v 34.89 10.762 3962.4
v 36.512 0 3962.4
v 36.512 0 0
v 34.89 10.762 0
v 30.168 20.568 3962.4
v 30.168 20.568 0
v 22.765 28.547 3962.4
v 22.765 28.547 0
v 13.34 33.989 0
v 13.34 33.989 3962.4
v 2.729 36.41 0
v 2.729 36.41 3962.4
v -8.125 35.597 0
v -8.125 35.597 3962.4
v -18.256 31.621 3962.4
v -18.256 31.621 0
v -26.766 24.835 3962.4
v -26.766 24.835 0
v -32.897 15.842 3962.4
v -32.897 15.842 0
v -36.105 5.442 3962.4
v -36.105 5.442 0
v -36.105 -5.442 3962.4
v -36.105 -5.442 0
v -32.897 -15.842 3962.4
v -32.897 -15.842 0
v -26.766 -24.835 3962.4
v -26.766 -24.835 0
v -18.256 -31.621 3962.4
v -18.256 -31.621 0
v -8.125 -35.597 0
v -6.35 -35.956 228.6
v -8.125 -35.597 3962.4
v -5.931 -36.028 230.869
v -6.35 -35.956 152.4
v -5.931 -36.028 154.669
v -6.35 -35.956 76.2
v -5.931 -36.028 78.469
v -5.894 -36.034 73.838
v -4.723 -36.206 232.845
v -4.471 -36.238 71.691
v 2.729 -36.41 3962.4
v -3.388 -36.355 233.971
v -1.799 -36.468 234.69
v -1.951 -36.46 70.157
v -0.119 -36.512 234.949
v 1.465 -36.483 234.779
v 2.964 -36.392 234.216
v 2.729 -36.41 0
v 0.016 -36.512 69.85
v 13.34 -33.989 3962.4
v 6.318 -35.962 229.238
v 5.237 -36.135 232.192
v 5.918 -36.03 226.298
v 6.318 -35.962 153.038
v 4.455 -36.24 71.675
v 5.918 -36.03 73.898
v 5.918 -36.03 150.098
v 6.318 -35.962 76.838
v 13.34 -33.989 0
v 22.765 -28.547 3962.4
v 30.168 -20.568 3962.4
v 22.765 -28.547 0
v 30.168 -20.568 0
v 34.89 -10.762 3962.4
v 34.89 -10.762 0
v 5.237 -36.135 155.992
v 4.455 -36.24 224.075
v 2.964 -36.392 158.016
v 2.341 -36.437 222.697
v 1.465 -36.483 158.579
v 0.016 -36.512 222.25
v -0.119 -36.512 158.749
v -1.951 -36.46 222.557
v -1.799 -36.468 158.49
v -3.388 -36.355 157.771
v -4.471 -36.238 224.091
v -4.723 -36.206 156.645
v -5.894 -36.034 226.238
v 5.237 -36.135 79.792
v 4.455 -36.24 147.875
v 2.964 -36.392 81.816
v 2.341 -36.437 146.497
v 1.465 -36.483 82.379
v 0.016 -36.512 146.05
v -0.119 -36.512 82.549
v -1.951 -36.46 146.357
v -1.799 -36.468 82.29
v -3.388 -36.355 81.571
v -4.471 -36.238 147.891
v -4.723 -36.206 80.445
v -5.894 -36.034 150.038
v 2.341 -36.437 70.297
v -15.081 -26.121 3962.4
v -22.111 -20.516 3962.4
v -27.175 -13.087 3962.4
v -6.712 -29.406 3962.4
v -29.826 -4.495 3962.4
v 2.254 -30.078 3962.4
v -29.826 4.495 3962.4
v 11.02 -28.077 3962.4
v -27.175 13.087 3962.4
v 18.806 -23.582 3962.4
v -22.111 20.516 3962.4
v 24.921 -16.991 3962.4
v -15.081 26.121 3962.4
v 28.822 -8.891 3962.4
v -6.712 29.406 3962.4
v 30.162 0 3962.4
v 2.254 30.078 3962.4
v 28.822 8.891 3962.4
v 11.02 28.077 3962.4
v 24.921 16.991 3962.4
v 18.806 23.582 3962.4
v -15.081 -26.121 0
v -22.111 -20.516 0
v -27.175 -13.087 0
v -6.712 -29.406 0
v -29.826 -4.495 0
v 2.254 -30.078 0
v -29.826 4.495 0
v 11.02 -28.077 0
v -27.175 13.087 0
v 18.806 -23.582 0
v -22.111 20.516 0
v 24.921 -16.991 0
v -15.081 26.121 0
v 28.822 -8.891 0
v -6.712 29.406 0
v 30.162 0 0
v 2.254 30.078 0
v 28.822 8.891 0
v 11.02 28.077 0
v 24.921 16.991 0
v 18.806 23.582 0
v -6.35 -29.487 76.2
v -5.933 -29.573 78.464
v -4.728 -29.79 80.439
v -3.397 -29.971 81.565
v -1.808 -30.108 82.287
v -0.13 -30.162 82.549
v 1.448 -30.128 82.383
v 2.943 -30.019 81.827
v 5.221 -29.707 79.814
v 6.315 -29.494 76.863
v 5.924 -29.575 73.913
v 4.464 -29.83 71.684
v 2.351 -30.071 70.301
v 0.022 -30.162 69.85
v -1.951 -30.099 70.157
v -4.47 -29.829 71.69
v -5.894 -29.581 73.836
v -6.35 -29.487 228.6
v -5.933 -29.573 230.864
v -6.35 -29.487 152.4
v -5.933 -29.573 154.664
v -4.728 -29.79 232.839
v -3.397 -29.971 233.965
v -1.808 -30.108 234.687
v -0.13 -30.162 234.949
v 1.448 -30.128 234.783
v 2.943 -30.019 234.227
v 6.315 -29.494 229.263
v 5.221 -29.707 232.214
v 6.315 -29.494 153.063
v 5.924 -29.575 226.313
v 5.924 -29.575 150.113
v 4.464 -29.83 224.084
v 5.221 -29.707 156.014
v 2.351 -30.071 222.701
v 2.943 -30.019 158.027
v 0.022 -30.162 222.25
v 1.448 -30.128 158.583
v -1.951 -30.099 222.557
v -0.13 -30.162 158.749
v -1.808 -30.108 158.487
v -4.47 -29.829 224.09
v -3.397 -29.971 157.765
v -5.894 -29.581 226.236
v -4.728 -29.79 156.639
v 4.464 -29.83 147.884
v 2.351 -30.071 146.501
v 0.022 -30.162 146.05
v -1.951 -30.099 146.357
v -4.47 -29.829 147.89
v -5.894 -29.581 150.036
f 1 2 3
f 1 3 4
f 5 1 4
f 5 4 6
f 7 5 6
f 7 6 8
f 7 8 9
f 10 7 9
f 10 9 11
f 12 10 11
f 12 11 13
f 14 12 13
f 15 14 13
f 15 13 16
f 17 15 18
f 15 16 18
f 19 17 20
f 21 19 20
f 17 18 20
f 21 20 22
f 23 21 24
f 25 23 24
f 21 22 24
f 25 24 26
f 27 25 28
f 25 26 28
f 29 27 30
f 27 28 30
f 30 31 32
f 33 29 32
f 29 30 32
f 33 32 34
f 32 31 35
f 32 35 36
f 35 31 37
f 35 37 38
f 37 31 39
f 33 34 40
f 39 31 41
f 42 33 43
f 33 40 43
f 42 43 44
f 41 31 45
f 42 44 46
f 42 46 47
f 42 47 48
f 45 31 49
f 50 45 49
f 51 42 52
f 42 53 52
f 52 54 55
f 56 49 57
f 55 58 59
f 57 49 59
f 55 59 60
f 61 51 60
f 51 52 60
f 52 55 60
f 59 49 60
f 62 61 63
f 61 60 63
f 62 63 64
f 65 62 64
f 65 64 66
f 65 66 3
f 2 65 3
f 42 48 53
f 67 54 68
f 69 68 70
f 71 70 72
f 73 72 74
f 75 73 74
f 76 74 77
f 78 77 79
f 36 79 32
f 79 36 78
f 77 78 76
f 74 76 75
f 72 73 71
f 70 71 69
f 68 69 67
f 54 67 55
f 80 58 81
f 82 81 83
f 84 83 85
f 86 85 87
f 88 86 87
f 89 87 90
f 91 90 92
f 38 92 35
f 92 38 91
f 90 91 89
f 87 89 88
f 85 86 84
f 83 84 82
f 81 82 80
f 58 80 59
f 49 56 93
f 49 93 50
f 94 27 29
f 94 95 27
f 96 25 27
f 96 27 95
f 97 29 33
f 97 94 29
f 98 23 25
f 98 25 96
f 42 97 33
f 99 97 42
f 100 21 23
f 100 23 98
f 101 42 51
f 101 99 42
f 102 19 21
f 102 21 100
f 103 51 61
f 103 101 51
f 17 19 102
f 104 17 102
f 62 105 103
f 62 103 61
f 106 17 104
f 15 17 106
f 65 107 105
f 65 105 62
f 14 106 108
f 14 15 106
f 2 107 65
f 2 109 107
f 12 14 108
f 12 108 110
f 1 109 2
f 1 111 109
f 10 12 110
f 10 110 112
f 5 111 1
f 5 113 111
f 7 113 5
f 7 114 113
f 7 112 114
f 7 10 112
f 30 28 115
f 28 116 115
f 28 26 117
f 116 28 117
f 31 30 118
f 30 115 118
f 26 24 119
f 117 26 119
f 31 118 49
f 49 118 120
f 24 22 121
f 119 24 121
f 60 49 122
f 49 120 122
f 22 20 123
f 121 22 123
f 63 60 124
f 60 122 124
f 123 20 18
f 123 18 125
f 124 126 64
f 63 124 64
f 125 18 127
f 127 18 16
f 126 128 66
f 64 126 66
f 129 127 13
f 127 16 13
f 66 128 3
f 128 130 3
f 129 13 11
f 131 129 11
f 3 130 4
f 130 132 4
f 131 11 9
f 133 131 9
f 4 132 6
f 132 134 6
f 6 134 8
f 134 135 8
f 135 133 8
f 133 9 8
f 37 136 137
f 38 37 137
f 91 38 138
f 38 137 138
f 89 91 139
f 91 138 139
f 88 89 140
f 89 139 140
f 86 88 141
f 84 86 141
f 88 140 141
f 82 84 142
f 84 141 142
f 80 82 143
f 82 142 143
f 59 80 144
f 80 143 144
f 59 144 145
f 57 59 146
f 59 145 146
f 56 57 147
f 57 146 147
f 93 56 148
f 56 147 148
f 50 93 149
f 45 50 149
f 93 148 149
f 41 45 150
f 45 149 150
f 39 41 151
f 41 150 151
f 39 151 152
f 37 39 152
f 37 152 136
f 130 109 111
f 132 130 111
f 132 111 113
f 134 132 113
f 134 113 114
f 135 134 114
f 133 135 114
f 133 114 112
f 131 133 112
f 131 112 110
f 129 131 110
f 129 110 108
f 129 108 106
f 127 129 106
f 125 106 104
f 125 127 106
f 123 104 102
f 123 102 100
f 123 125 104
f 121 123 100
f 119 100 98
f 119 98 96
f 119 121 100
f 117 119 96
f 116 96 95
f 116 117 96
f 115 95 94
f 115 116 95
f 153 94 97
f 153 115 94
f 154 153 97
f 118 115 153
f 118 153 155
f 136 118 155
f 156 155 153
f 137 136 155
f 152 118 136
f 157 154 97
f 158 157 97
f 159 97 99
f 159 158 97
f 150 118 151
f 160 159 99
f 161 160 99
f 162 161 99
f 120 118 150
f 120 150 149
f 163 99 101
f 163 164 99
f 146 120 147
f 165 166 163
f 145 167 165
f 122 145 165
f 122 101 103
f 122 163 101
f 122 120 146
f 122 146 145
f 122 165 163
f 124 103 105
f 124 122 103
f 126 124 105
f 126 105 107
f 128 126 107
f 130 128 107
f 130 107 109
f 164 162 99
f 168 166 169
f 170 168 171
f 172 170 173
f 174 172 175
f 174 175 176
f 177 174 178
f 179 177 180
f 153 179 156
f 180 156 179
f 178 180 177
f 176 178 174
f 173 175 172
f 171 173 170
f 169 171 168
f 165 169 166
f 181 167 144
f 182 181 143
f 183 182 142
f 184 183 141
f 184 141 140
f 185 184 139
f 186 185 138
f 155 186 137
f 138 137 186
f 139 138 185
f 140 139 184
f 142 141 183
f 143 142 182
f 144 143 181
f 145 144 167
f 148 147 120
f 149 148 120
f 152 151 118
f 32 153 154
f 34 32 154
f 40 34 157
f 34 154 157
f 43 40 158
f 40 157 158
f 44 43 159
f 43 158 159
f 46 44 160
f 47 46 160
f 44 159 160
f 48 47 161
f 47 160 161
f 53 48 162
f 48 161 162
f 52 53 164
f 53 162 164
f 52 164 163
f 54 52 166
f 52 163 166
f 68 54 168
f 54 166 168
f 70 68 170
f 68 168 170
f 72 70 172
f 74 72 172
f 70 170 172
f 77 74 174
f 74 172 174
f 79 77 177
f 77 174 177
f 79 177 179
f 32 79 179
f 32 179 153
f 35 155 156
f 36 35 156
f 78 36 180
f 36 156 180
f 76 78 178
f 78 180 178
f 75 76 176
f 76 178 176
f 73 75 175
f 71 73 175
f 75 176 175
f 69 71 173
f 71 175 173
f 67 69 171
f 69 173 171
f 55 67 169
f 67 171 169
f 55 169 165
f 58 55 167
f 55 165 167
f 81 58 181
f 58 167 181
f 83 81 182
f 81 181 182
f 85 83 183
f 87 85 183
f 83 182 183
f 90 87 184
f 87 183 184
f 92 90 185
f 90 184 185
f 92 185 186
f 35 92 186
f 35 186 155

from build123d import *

# Parameters (mm, degrees)
F0_R     = 36.5125
F0_R_2   = 30.1625
F1_DEPTH = 3962.4
F4_R     = 6.35
F5_DEPTH = 37.5125000999


with BuildPart() as f1:
    # F0 (on Top) → F1 (new body)
    with BuildSketch(Plane.XY):
        Circle(F0_R)
        Circle(F0_R_2, mode=Mode.SUBTRACT)
    extrude(amount=F1_DEPTH)

    # F4 (on line) → F5 (cut, up to face)
    with BuildSketch(Plane(origin=(0, 0, 0), x_dir=(-1, 0, 0), z_dir=(0, 1, 0))):
        with Locations((0, 76.2)):
            Circle(F4_R)
        with Locations((0, 152.4)):
            Circle(F4_R)
        with Locations((0, 228.6)):
            Circle(F4_R)
    extrude(amount=-F5_DEPTH, mode=Mode.SUBTRACT)


solid = f1.part
